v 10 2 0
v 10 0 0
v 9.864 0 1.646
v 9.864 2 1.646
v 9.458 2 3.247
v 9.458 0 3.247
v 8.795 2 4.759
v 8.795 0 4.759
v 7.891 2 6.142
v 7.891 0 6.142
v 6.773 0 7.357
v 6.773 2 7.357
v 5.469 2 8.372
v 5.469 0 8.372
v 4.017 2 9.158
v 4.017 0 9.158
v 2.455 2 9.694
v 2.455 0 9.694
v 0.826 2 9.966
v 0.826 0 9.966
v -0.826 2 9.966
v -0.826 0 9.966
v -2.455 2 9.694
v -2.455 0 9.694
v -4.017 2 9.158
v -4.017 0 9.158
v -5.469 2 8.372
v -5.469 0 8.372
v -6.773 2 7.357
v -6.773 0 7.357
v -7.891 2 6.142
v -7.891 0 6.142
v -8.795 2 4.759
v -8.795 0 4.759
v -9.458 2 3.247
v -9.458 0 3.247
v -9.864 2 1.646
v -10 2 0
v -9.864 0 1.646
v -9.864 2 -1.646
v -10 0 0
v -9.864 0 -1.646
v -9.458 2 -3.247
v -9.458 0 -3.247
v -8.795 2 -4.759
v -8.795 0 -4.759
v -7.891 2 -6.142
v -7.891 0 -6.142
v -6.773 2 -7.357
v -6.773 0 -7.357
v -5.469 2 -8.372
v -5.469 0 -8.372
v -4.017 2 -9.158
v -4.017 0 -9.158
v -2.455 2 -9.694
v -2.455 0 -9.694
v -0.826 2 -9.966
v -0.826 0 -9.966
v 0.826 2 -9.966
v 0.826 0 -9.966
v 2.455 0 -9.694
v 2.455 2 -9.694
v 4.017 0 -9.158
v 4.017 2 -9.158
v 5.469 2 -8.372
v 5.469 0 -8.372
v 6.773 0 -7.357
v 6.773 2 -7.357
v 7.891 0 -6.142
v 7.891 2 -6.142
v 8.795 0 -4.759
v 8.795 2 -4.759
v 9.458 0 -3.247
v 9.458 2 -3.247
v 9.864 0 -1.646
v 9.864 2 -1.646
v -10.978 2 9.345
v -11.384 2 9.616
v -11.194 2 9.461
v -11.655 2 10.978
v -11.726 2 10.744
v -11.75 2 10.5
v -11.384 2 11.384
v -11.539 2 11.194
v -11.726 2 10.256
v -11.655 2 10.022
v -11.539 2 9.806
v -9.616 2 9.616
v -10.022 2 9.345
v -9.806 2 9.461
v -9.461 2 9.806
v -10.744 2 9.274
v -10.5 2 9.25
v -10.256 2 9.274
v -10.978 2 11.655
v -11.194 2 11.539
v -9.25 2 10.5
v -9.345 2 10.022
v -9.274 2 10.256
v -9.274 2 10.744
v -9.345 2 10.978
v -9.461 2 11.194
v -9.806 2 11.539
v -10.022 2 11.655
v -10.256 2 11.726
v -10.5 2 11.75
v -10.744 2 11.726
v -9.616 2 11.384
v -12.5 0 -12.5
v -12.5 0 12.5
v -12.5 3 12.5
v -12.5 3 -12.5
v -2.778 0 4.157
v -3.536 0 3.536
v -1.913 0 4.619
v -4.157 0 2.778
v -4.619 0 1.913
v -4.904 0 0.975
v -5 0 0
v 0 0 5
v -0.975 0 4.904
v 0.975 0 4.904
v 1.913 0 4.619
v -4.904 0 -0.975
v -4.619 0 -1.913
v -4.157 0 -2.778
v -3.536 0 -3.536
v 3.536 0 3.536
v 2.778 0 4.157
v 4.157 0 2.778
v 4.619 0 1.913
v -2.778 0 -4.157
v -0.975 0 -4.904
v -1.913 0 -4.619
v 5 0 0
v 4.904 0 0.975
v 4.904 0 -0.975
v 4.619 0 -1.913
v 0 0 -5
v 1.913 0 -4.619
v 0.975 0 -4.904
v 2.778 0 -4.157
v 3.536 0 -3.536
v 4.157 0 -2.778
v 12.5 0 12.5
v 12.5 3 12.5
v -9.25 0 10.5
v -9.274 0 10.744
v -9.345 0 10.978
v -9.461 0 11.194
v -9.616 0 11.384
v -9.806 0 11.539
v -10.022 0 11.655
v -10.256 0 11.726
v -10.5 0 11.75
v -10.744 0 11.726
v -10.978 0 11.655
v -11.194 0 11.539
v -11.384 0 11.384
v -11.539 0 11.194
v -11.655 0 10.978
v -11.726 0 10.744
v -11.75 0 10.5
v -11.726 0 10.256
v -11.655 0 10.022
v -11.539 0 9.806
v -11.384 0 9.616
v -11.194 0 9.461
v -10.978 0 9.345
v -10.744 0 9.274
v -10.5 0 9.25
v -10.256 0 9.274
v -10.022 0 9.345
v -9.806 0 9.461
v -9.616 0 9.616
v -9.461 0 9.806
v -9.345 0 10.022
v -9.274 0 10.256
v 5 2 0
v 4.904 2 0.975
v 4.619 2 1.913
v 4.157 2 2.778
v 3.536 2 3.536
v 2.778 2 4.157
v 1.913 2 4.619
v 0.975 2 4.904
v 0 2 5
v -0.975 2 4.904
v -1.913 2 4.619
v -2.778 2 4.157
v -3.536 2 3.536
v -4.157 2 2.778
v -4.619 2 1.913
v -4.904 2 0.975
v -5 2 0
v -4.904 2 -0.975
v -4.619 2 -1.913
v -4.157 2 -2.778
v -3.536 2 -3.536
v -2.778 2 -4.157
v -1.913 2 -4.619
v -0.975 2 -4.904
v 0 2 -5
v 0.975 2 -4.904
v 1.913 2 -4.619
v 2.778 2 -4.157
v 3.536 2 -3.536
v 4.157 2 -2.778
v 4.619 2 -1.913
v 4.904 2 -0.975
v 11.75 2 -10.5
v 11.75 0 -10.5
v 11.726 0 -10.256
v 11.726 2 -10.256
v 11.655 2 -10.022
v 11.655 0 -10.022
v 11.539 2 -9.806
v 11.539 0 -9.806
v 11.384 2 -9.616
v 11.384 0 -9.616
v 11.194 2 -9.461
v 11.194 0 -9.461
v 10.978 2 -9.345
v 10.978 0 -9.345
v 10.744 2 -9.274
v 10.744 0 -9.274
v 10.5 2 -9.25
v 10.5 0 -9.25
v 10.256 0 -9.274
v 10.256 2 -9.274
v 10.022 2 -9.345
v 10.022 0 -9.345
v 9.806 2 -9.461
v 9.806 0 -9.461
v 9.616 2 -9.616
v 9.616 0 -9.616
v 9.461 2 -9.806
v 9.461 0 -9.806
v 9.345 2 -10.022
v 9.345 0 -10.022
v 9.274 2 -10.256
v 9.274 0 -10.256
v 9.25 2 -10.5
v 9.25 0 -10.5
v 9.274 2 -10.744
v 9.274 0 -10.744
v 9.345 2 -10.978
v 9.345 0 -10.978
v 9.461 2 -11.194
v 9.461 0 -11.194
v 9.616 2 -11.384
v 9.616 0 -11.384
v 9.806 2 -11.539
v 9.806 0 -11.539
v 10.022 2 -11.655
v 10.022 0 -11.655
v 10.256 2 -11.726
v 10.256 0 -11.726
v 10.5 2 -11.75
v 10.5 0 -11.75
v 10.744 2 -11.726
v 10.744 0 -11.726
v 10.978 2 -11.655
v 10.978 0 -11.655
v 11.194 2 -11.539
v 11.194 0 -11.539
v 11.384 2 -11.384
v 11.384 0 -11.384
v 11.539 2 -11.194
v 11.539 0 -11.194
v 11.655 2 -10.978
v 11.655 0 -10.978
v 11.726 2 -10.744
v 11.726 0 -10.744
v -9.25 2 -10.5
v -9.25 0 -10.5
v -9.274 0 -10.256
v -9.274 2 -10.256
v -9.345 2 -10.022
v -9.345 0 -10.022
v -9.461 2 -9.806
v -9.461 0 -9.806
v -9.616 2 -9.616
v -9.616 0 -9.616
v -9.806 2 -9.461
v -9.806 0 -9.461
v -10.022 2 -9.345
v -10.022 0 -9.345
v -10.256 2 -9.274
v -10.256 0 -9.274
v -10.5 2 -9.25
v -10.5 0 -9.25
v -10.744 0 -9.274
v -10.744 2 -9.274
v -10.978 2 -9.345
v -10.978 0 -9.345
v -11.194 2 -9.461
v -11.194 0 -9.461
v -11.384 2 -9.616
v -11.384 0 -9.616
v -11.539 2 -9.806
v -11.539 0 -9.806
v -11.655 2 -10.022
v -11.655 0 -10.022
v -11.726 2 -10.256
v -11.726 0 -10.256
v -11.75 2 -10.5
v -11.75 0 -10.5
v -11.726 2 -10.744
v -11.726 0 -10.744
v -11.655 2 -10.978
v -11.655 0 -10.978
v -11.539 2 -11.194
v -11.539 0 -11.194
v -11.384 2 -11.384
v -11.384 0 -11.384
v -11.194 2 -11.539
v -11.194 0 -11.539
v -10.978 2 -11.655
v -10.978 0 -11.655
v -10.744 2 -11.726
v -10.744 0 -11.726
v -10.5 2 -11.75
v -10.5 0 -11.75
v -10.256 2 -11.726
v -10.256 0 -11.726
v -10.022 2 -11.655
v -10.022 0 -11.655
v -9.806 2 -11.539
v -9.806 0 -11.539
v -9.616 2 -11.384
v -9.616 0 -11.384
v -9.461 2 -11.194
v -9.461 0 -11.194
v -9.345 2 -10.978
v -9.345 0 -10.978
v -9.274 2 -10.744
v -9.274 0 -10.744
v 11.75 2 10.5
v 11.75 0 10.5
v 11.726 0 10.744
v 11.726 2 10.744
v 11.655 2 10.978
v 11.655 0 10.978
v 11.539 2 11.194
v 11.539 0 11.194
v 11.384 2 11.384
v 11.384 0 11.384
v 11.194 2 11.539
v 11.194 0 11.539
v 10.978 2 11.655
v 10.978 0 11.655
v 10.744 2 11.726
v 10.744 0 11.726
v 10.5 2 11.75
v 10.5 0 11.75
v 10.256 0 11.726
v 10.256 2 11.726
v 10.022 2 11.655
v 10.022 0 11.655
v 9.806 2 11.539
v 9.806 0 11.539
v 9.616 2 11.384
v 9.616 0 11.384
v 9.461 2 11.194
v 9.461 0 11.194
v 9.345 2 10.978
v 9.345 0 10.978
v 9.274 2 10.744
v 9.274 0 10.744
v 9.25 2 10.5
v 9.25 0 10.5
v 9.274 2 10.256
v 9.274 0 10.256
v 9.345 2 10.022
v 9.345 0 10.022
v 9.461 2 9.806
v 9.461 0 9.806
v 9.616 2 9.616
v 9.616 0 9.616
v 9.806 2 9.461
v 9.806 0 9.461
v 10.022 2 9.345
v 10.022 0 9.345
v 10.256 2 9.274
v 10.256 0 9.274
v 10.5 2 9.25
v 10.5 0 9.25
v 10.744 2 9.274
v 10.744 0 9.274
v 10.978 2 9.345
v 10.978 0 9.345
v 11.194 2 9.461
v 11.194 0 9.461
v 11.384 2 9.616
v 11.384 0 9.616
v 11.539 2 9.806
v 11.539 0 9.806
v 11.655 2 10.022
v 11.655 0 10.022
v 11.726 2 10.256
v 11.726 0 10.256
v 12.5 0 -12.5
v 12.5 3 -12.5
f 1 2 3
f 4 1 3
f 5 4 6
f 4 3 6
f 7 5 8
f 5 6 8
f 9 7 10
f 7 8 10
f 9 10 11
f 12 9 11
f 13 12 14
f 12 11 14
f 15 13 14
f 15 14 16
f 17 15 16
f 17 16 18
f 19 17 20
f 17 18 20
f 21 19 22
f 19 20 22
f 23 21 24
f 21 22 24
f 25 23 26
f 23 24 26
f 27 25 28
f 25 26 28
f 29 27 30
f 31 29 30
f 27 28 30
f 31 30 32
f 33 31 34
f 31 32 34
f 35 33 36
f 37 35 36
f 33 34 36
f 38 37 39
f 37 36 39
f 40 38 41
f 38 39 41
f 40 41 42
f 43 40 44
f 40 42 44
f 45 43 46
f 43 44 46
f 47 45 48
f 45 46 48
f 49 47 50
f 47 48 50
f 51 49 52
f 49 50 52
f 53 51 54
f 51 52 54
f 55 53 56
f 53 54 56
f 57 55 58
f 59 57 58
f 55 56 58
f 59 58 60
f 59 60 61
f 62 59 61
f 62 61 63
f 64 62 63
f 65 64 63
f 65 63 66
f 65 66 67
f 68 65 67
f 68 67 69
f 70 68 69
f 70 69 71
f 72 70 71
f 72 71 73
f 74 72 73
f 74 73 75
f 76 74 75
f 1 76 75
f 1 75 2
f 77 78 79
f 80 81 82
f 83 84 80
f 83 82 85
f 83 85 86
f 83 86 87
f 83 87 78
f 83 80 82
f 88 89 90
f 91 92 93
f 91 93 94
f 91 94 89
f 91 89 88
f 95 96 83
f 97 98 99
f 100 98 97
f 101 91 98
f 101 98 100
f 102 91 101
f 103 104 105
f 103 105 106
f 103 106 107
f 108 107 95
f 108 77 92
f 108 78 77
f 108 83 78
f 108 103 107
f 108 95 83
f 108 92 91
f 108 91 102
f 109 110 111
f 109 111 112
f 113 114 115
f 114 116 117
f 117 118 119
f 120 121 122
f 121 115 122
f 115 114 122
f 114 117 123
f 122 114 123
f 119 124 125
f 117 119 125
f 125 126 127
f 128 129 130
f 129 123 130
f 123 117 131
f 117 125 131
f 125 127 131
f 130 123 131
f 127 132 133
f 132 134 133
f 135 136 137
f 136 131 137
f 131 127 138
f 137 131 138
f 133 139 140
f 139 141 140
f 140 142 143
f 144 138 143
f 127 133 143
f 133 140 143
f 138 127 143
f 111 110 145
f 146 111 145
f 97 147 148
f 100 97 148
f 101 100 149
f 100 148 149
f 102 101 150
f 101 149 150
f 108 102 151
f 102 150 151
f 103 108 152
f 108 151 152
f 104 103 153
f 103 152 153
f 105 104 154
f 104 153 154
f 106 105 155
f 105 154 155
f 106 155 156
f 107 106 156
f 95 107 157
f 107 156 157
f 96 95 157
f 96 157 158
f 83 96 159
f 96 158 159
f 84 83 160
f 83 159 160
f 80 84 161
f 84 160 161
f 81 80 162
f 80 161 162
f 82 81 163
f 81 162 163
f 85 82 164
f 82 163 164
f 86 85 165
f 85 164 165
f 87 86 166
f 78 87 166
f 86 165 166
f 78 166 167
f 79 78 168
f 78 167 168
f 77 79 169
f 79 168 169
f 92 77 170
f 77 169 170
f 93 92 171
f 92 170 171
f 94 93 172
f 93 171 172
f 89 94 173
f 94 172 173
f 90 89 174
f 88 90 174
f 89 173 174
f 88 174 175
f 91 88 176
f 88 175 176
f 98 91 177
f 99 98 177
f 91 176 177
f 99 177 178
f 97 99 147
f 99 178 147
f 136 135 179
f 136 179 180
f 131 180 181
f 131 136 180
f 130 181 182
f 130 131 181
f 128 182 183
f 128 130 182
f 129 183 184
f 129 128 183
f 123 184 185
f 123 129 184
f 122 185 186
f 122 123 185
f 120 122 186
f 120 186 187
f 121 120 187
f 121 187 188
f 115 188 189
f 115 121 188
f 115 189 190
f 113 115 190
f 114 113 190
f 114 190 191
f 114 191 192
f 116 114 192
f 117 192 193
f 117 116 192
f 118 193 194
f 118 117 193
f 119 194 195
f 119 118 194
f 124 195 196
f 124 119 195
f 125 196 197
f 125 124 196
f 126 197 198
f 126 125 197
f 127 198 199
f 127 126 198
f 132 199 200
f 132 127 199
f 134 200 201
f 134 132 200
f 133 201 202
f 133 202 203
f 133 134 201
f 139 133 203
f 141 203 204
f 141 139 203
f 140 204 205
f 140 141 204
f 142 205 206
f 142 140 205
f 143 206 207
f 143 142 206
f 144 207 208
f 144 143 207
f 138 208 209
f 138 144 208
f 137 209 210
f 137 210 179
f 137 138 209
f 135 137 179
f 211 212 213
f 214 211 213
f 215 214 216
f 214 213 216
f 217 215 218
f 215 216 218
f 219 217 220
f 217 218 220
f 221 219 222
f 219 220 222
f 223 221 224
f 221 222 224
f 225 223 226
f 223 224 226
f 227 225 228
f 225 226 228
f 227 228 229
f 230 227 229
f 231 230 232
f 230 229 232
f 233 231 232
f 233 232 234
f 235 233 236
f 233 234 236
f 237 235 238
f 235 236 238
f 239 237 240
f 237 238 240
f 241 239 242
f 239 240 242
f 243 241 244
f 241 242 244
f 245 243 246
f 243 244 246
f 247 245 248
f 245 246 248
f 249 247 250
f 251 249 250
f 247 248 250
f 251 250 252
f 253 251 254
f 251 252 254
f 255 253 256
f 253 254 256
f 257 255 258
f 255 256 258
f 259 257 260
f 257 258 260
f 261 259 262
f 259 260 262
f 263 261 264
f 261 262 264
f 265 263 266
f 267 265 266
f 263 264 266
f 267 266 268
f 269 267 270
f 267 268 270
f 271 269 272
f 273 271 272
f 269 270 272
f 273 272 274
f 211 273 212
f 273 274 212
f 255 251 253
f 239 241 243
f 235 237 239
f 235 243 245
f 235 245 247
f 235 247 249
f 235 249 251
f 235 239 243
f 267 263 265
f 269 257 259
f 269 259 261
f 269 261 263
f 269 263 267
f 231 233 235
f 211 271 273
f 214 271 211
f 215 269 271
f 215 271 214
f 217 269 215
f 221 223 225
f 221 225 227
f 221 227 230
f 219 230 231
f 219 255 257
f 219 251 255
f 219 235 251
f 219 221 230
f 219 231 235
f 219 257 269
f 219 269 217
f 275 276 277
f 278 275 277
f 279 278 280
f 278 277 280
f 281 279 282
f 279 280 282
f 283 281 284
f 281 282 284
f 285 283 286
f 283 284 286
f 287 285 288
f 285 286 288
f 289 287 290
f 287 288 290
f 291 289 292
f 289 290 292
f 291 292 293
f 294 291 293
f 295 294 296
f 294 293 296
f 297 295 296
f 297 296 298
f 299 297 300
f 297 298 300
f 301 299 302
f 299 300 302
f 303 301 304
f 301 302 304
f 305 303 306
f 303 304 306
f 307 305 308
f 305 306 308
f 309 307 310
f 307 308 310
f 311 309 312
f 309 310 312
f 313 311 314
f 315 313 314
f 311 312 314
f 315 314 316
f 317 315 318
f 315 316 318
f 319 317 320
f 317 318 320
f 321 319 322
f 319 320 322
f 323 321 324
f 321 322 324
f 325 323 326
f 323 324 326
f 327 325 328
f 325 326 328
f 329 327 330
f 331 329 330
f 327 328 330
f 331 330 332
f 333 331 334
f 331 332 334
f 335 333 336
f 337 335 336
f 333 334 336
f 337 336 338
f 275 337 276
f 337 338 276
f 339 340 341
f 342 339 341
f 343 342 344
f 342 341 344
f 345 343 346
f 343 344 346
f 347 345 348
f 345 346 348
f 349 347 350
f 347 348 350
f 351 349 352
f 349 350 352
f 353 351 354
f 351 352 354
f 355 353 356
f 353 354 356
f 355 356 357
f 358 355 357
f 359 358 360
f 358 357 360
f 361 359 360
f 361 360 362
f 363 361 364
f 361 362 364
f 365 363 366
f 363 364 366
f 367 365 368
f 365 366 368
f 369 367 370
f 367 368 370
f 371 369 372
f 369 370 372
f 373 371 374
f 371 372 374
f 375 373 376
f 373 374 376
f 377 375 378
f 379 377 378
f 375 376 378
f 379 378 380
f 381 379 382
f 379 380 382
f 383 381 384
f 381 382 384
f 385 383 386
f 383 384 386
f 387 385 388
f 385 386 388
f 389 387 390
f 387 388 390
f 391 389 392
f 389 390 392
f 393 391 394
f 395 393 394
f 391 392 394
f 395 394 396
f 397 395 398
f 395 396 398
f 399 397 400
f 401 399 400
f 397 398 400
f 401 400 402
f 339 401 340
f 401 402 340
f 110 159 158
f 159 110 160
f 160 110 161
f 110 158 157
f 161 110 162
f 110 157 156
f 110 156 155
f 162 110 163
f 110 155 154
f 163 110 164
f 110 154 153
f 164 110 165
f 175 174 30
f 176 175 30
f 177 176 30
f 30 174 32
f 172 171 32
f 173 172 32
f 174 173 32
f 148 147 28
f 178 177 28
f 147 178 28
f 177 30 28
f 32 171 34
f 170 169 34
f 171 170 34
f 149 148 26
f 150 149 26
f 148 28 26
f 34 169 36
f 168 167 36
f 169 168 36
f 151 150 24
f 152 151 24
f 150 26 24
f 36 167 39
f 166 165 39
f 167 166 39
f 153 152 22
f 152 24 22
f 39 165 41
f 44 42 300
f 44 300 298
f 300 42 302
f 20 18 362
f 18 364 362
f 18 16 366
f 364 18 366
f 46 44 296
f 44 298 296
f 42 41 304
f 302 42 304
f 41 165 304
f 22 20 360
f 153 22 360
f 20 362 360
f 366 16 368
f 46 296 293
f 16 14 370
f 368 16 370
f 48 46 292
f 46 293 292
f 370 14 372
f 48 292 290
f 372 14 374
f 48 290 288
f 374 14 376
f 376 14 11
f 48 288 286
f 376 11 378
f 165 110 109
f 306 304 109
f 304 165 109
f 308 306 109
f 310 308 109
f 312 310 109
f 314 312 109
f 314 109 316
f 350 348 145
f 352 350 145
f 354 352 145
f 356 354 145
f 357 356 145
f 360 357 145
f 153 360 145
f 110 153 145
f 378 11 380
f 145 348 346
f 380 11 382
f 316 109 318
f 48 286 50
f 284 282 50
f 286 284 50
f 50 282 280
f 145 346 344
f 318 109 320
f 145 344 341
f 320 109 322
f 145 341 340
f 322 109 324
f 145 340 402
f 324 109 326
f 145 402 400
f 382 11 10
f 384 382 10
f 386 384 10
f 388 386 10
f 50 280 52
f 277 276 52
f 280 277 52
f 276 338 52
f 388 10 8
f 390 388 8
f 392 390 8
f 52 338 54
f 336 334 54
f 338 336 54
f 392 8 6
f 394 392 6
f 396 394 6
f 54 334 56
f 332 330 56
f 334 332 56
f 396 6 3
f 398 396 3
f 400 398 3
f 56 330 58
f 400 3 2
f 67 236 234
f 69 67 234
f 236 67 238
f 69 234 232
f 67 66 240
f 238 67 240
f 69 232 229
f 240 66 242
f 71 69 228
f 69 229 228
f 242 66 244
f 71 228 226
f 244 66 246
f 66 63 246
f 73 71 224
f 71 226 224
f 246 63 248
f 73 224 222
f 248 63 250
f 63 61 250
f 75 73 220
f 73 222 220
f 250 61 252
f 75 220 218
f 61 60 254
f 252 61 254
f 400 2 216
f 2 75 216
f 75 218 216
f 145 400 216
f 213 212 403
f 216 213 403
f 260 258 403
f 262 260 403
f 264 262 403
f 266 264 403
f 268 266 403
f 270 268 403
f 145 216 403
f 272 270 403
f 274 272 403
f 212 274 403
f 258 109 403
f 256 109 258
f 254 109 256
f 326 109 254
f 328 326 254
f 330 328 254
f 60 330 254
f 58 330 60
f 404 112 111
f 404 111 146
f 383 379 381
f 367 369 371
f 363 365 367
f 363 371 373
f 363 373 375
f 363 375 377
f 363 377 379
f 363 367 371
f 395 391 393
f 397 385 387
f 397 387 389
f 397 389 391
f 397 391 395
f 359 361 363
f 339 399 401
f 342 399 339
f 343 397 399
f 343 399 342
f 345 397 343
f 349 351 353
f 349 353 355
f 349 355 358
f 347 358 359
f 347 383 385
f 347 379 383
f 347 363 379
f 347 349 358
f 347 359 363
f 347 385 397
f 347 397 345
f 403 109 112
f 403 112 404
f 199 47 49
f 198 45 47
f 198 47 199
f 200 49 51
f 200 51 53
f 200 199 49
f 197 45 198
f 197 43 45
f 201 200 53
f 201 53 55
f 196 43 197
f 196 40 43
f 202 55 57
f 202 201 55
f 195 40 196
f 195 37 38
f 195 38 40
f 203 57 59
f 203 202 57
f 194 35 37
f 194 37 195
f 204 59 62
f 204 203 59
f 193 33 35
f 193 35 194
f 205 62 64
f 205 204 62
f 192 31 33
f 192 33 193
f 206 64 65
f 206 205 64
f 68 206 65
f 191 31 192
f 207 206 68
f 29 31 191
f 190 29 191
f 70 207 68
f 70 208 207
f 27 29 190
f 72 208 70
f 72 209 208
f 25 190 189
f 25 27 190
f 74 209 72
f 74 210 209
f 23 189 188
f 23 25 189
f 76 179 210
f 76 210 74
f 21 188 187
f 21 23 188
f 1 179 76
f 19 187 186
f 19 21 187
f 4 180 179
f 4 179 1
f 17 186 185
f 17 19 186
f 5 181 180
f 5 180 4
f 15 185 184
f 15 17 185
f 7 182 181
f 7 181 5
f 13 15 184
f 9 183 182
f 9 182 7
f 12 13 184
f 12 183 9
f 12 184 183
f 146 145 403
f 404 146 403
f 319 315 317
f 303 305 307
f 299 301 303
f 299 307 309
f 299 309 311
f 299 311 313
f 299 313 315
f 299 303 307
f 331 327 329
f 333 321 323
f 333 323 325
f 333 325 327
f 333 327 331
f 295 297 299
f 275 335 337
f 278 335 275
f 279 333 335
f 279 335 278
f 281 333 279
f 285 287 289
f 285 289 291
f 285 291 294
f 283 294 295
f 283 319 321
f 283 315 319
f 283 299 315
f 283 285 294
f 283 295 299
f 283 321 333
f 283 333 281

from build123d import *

# Parameters (mm, degrees)
SKETCH1_W           = 25
SKETCH1_H           = 25
BOSS_EXTRUDE1_DEPTH = 3
SKETCH2_R           = 10
SKETCH2_R_2         = 5
CUT_EXTRUDE1_DEPTH  = 2
SKETCH3_R           = 1.25
CUT_EXTRUDE2_DEPTH  = 2


with BuildPart() as part:
    # Sketch1 → Boss-Extrude1 (new body)
    with BuildSketch(Plane(origin=(0, 0, 0), x_dir=(1, 0, 0), z_dir=(0, 1, 0))):
        Rectangle(SKETCH1_W, SKETCH1_H)
    extrude(amount=BOSS_EXTRUDE1_DEPTH)

    # Sketch2 → Cut-Extrude1 (cut)
    with BuildSketch(Plane.XZ):
        Circle(SKETCH2_R)
        Circle(SKETCH2_R_2, mode=Mode.SUBTRACT)
    extrude(amount=-CUT_EXTRUDE1_DEPTH, mode=Mode.SUBTRACT)

    # Sketch3 → Cut-Extrude2 (cut)
    with BuildSketch(Plane.XZ):
        with Locations((-10.5, 10.5)):
            Circle(SKETCH3_R)
        with Locations((10.5, 10.5)):
            Circle(SKETCH3_R)
        with Locations((10.5, -10.5)):
            Circle(SKETCH3_R)
        with Locations((-10.5, -10.5)):
            Circle(SKETCH3_R)
    extrude(amount=-CUT_EXTRUDE2_DEPTH, mode=Mode.SUBTRACT)


solid = part.part
